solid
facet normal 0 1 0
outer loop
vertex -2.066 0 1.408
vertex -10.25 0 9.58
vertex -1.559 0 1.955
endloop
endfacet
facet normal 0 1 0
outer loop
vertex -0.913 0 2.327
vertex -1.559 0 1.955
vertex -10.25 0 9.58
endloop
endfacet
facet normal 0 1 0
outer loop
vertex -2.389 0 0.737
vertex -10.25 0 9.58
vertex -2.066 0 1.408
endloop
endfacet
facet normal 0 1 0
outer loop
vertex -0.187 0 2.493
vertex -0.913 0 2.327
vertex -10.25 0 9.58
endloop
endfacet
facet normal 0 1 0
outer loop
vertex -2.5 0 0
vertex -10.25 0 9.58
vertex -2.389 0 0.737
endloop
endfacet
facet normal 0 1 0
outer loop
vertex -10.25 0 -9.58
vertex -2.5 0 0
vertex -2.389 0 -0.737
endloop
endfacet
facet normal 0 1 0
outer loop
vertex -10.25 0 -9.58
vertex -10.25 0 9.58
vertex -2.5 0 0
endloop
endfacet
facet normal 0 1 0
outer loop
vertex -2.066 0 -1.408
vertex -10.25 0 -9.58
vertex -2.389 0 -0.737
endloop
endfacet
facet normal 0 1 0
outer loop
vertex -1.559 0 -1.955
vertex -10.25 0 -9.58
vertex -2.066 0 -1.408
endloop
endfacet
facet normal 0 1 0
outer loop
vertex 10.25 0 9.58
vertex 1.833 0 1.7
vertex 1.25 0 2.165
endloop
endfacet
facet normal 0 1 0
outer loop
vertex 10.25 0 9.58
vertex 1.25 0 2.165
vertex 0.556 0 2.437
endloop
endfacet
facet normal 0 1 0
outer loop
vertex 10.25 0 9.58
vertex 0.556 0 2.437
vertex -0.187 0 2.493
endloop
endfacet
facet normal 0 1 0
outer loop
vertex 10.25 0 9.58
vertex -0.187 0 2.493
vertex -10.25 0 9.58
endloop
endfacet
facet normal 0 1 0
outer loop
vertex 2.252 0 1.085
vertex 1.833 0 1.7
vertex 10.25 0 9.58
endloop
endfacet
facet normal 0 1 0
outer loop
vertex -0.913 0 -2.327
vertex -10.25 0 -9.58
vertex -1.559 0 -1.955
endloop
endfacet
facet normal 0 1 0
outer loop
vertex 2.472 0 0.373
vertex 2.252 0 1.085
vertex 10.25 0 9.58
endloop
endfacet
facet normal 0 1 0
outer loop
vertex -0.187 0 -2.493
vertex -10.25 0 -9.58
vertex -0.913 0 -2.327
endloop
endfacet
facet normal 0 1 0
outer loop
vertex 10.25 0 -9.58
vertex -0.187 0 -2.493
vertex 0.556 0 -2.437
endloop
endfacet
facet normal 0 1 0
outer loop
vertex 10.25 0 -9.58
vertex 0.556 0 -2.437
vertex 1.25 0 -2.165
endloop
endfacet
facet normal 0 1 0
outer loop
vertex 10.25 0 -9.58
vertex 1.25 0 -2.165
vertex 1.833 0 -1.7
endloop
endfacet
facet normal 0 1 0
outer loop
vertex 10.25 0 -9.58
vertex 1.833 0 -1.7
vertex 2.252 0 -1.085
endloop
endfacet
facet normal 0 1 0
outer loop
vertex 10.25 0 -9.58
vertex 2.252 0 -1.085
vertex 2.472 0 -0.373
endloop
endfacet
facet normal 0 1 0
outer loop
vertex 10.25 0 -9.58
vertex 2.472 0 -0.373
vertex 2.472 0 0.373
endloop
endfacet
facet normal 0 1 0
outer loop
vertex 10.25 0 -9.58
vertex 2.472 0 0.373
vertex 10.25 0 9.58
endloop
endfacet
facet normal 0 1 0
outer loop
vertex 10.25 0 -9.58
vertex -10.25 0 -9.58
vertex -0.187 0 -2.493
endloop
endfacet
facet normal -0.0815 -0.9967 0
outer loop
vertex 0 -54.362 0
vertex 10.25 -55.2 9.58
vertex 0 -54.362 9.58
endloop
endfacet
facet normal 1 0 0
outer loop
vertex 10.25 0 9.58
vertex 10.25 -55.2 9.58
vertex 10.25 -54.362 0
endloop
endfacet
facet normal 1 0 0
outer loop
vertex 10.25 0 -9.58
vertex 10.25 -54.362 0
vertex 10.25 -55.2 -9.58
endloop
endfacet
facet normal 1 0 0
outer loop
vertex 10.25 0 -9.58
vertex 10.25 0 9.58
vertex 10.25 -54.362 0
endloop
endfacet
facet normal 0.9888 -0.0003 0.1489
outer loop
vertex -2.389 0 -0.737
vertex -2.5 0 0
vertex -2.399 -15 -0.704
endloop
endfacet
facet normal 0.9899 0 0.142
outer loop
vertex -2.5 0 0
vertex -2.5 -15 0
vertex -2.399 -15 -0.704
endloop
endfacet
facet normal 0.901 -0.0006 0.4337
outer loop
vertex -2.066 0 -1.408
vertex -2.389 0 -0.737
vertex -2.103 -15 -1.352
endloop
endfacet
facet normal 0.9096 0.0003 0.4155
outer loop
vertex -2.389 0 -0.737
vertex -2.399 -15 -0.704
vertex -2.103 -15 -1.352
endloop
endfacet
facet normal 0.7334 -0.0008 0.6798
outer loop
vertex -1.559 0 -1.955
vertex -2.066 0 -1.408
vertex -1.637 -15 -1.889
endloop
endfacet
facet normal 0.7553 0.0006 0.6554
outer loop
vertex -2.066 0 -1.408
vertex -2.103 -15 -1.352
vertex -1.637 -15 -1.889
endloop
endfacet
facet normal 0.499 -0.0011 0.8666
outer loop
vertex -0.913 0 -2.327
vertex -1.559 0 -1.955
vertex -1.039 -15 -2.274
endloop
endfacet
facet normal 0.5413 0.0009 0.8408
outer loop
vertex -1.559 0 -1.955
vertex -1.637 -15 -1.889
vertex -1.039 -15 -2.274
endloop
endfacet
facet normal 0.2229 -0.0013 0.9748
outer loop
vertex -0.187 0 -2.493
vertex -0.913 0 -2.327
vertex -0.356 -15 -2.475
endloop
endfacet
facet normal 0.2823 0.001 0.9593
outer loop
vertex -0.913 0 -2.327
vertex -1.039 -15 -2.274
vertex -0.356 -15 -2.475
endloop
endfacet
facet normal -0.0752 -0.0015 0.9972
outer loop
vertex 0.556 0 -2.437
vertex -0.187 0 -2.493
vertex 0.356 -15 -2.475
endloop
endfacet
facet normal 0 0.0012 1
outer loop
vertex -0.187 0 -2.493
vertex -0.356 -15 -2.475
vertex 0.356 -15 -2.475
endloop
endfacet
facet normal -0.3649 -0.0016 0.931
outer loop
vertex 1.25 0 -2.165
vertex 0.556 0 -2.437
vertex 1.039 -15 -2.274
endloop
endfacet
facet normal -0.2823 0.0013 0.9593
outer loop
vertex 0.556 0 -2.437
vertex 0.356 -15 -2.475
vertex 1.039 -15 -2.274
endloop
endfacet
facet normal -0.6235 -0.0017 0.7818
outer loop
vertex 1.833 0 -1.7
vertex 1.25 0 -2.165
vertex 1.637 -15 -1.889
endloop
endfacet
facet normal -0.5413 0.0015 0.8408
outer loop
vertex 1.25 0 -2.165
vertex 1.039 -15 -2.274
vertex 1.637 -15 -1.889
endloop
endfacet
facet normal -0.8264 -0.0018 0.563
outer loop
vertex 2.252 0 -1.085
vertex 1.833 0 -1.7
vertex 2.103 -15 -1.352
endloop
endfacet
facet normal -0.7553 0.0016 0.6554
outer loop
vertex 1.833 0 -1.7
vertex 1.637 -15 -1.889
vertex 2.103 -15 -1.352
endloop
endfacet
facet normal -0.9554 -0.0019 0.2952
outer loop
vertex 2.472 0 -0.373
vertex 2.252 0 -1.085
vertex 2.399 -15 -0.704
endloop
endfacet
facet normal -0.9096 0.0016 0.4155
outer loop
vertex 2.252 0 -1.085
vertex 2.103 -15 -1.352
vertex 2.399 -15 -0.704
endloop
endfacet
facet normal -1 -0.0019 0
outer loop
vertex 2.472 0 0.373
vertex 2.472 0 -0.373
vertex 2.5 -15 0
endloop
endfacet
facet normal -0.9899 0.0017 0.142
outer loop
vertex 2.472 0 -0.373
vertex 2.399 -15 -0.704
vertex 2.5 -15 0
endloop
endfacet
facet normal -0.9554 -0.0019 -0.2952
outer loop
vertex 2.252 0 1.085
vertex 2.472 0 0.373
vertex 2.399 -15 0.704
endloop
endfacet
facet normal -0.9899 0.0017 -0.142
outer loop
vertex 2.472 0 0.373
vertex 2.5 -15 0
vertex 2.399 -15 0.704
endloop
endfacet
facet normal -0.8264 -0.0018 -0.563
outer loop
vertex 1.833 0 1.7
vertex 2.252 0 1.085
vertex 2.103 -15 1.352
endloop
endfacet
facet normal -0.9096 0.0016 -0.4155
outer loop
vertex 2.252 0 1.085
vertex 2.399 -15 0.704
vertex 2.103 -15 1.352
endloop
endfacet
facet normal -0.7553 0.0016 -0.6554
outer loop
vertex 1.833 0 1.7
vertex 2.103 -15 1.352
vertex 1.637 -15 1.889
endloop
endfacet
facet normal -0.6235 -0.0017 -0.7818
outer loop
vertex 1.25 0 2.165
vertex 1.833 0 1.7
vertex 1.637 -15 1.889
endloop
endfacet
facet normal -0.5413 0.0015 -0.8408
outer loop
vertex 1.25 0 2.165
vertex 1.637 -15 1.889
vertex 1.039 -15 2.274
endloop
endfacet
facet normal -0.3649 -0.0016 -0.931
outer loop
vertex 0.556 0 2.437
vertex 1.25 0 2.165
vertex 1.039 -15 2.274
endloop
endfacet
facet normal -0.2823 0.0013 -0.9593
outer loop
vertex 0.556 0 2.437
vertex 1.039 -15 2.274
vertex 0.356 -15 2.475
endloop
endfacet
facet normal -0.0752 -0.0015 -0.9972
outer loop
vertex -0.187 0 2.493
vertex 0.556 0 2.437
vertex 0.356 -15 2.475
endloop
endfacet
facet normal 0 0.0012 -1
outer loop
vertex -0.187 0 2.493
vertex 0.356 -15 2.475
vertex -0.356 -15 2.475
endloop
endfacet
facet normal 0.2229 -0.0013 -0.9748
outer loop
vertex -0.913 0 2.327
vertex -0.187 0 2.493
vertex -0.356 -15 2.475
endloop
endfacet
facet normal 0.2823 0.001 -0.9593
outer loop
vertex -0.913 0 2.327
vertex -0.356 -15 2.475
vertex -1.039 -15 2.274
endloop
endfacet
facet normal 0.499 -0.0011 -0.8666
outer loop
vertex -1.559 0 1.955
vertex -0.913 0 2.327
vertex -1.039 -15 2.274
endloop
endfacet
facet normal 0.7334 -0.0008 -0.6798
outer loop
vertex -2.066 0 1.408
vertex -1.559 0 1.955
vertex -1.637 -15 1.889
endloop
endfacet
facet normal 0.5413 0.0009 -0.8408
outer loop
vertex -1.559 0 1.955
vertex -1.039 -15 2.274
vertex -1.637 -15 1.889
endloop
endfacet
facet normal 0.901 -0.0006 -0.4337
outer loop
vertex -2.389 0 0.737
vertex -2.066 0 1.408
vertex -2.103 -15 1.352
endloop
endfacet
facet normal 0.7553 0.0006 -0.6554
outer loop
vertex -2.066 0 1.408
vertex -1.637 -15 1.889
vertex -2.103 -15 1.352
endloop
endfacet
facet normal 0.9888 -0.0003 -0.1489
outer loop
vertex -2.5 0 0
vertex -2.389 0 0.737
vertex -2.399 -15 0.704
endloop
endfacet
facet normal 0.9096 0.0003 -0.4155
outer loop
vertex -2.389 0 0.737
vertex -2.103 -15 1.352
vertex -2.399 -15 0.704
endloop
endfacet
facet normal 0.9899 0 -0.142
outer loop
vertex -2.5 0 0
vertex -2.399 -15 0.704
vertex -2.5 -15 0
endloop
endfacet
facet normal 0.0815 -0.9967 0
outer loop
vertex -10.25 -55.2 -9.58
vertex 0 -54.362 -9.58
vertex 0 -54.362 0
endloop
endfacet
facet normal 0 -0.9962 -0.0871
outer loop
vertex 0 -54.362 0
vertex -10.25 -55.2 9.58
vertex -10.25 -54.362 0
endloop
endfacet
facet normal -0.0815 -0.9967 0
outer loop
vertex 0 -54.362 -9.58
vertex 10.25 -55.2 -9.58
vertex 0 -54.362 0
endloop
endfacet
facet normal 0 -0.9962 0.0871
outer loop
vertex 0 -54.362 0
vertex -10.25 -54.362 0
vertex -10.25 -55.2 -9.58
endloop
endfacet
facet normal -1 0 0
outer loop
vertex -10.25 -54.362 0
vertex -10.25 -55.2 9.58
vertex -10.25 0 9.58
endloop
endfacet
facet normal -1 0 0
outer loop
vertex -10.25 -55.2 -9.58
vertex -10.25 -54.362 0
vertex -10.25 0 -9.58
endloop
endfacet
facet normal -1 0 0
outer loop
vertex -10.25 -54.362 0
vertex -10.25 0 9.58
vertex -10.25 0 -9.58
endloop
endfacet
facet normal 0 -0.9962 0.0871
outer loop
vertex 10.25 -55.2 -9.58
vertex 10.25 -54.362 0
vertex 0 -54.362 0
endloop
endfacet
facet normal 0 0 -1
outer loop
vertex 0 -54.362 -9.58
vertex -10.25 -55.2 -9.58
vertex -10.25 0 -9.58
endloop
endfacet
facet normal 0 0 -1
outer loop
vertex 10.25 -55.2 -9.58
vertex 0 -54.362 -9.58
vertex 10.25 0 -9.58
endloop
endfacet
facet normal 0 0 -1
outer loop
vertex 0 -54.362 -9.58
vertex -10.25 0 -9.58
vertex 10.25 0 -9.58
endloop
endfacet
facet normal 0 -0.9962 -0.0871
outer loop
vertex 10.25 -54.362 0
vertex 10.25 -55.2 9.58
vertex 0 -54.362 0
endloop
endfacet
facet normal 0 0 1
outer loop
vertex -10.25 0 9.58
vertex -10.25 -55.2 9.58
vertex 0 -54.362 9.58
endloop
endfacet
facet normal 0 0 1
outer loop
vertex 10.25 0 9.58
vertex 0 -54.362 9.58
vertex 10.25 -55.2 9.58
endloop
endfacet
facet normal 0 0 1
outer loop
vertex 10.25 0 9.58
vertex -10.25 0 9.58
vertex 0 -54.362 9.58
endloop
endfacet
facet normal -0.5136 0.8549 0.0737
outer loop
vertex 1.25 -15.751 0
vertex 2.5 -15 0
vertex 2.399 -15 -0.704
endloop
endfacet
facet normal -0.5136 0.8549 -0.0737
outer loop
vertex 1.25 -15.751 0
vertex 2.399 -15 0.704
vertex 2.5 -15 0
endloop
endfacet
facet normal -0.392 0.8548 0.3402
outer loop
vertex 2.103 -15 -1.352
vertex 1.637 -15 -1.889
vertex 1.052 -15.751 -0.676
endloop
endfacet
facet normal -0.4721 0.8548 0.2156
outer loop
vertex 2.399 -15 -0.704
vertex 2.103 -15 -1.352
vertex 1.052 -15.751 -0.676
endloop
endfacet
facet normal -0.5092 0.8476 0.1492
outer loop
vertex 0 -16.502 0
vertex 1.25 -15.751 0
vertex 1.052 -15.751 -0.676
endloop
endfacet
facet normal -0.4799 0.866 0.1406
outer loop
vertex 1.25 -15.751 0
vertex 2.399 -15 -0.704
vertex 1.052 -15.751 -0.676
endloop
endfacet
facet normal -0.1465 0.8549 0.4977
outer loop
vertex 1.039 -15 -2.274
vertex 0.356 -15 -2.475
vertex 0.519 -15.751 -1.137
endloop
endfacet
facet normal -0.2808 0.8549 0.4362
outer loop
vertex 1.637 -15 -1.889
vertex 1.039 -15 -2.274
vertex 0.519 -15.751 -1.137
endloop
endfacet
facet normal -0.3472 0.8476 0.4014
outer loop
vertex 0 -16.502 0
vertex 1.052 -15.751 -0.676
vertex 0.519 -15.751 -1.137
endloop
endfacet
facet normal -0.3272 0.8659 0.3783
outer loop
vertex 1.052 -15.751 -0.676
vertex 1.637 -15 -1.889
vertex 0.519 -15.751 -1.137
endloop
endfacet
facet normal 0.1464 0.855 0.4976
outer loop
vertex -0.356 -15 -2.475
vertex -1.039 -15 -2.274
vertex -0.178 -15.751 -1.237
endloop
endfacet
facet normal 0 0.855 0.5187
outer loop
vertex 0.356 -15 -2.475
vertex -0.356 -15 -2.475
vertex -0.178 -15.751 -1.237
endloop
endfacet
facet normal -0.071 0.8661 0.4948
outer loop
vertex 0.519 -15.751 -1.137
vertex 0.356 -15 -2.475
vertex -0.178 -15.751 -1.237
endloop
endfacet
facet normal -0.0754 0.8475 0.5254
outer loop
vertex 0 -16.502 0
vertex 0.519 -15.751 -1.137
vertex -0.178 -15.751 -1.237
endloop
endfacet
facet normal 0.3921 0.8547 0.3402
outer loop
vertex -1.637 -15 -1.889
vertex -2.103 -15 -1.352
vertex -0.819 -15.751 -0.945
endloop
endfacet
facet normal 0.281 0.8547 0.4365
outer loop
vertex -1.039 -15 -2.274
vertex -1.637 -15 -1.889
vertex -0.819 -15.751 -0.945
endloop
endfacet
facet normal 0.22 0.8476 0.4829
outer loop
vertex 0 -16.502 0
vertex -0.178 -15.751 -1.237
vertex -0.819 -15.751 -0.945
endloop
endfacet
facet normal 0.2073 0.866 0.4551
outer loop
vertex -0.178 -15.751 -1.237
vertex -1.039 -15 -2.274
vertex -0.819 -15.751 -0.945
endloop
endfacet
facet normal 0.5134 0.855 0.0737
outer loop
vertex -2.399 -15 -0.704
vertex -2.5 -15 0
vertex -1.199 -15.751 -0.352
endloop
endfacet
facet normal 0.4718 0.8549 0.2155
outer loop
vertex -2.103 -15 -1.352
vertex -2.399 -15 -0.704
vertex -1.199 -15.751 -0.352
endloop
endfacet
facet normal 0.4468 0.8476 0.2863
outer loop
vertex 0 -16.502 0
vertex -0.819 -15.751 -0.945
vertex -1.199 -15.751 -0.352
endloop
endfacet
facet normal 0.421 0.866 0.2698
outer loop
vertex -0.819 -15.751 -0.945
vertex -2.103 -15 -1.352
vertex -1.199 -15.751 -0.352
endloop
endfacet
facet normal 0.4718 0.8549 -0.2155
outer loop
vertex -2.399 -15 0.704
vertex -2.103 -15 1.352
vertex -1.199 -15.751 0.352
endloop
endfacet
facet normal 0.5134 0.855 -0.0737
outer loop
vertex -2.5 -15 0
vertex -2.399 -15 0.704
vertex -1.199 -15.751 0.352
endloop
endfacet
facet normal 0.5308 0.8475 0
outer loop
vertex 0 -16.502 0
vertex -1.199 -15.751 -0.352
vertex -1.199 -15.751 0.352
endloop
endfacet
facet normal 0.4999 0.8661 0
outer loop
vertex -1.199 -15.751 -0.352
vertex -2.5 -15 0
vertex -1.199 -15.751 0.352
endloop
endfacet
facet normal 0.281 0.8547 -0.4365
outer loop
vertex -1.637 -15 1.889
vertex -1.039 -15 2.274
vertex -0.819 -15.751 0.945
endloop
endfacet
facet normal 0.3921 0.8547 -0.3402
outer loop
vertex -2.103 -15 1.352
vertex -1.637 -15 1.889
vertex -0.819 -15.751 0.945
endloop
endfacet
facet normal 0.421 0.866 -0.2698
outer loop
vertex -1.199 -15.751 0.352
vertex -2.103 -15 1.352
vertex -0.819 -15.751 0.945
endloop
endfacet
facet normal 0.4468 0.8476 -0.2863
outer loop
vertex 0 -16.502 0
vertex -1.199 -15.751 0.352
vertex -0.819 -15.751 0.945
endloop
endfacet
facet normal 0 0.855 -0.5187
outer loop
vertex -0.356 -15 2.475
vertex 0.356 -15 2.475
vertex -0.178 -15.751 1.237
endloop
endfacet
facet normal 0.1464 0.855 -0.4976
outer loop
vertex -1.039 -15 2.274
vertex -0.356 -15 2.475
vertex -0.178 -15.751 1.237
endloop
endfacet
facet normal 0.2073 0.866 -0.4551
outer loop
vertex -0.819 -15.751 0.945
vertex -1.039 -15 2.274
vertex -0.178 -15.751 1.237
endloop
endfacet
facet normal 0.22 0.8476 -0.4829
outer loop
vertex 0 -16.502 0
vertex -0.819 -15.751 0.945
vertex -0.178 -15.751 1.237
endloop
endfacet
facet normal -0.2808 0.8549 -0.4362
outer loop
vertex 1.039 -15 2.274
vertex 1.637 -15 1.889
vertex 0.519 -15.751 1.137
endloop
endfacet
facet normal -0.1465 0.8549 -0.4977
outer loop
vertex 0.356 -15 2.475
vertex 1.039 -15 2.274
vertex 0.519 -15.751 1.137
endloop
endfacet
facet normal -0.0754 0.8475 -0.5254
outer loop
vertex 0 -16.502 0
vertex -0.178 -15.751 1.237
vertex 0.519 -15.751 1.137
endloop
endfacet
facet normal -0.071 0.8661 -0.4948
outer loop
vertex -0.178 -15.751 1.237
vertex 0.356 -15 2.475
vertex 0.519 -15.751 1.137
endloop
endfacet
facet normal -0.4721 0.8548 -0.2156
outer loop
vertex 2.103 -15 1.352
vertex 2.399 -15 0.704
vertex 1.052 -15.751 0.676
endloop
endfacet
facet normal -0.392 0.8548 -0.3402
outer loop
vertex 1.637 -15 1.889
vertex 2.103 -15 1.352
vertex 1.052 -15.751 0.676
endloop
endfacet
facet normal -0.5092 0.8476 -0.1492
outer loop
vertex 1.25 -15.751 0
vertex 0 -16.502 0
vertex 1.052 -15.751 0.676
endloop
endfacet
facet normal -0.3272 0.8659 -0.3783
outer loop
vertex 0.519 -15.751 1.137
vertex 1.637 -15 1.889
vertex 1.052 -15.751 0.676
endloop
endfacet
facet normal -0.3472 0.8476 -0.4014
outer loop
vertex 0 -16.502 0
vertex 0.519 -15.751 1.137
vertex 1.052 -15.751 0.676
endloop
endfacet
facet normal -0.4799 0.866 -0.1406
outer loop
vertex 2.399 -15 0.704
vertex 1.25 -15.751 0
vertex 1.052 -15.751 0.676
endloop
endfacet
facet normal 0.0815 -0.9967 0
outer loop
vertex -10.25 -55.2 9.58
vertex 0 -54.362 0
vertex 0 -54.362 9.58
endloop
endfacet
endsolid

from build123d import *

# Parameters (mm, degrees)
SKETCH1_W             = 20.5
SKETCH1_H             = 19.16
BOSS_EXTRUDE1_DEPTH   = 55.2
CUT_EXTRUDE3_DEPTH    = 60.657911462
CUT_EXTRUDE4_DEPTH    = 60.322913785
M6_TAPPED_HOLE1_D     = 5
M6_TAPPED_HOLE1_DEPTH = 15
M6_TAPPED_HOLE1_TIP   = 1.502151548


with BuildPart() as part:
    # Sketch1 → Boss-Extrude1 (new body)
    with BuildSketch(Plane(origin=(0, 0, 0), x_dir=(1, 0, 0), z_dir=(0, 1, 0))):
        Rectangle(SKETCH1_W, SKETCH1_H)
    extrude(amount=-BOSS_EXTRUDE1_DEPTH)

    # Sketch5 → Cut-Extrude3 (cut, through all)
    with BuildSketch(Plane(origin=(10.25, 0, 0), x_dir=(0, 0, -1), z_dir=(1, 0, 0))):
        Polygon((-9.58, -55.2), (0, -54.361858603), (9.58, -55.2), align=None)
    extrude(amount=-CUT_EXTRUDE3_DEPTH, mode=Mode.SUBTRACT)

    # Sketch6 → Cut-Extrude4 (cut, through all)
    with BuildSketch(Plane(origin=(0, 0, -9.58), x_dir=(-1, 0, 0), z_dir=(0, 0, -1))):
        Polygon((-10.25, -55.2), (0, -54.361858603), (10.25, -55.2), align=None)
    extrude(amount=-CUT_EXTRUDE4_DEPTH, mode=Mode.SUBTRACT)

    # M6 Tapped Hole1
    with Locations(Plane(origin=(0, 0, 0), x_dir=(1, 0, 0), z_dir=(0, 1, 0))):
        with Locations((0, 0)):
            Hole(M6_TAPPED_HOLE1_D / 2, depth=M6_TAPPED_HOLE1_DEPTH)
            with Locations((0, 0, -(M6_TAPPED_HOLE1_DEPTH + M6_TAPPED_HOLE1_TIP / 2))):  # 118° drill point
                Cone(0, M6_TAPPED_HOLE1_D / 2, M6_TAPPED_HOLE1_TIP, mode=Mode.SUBTRACT)


solid = part.part
